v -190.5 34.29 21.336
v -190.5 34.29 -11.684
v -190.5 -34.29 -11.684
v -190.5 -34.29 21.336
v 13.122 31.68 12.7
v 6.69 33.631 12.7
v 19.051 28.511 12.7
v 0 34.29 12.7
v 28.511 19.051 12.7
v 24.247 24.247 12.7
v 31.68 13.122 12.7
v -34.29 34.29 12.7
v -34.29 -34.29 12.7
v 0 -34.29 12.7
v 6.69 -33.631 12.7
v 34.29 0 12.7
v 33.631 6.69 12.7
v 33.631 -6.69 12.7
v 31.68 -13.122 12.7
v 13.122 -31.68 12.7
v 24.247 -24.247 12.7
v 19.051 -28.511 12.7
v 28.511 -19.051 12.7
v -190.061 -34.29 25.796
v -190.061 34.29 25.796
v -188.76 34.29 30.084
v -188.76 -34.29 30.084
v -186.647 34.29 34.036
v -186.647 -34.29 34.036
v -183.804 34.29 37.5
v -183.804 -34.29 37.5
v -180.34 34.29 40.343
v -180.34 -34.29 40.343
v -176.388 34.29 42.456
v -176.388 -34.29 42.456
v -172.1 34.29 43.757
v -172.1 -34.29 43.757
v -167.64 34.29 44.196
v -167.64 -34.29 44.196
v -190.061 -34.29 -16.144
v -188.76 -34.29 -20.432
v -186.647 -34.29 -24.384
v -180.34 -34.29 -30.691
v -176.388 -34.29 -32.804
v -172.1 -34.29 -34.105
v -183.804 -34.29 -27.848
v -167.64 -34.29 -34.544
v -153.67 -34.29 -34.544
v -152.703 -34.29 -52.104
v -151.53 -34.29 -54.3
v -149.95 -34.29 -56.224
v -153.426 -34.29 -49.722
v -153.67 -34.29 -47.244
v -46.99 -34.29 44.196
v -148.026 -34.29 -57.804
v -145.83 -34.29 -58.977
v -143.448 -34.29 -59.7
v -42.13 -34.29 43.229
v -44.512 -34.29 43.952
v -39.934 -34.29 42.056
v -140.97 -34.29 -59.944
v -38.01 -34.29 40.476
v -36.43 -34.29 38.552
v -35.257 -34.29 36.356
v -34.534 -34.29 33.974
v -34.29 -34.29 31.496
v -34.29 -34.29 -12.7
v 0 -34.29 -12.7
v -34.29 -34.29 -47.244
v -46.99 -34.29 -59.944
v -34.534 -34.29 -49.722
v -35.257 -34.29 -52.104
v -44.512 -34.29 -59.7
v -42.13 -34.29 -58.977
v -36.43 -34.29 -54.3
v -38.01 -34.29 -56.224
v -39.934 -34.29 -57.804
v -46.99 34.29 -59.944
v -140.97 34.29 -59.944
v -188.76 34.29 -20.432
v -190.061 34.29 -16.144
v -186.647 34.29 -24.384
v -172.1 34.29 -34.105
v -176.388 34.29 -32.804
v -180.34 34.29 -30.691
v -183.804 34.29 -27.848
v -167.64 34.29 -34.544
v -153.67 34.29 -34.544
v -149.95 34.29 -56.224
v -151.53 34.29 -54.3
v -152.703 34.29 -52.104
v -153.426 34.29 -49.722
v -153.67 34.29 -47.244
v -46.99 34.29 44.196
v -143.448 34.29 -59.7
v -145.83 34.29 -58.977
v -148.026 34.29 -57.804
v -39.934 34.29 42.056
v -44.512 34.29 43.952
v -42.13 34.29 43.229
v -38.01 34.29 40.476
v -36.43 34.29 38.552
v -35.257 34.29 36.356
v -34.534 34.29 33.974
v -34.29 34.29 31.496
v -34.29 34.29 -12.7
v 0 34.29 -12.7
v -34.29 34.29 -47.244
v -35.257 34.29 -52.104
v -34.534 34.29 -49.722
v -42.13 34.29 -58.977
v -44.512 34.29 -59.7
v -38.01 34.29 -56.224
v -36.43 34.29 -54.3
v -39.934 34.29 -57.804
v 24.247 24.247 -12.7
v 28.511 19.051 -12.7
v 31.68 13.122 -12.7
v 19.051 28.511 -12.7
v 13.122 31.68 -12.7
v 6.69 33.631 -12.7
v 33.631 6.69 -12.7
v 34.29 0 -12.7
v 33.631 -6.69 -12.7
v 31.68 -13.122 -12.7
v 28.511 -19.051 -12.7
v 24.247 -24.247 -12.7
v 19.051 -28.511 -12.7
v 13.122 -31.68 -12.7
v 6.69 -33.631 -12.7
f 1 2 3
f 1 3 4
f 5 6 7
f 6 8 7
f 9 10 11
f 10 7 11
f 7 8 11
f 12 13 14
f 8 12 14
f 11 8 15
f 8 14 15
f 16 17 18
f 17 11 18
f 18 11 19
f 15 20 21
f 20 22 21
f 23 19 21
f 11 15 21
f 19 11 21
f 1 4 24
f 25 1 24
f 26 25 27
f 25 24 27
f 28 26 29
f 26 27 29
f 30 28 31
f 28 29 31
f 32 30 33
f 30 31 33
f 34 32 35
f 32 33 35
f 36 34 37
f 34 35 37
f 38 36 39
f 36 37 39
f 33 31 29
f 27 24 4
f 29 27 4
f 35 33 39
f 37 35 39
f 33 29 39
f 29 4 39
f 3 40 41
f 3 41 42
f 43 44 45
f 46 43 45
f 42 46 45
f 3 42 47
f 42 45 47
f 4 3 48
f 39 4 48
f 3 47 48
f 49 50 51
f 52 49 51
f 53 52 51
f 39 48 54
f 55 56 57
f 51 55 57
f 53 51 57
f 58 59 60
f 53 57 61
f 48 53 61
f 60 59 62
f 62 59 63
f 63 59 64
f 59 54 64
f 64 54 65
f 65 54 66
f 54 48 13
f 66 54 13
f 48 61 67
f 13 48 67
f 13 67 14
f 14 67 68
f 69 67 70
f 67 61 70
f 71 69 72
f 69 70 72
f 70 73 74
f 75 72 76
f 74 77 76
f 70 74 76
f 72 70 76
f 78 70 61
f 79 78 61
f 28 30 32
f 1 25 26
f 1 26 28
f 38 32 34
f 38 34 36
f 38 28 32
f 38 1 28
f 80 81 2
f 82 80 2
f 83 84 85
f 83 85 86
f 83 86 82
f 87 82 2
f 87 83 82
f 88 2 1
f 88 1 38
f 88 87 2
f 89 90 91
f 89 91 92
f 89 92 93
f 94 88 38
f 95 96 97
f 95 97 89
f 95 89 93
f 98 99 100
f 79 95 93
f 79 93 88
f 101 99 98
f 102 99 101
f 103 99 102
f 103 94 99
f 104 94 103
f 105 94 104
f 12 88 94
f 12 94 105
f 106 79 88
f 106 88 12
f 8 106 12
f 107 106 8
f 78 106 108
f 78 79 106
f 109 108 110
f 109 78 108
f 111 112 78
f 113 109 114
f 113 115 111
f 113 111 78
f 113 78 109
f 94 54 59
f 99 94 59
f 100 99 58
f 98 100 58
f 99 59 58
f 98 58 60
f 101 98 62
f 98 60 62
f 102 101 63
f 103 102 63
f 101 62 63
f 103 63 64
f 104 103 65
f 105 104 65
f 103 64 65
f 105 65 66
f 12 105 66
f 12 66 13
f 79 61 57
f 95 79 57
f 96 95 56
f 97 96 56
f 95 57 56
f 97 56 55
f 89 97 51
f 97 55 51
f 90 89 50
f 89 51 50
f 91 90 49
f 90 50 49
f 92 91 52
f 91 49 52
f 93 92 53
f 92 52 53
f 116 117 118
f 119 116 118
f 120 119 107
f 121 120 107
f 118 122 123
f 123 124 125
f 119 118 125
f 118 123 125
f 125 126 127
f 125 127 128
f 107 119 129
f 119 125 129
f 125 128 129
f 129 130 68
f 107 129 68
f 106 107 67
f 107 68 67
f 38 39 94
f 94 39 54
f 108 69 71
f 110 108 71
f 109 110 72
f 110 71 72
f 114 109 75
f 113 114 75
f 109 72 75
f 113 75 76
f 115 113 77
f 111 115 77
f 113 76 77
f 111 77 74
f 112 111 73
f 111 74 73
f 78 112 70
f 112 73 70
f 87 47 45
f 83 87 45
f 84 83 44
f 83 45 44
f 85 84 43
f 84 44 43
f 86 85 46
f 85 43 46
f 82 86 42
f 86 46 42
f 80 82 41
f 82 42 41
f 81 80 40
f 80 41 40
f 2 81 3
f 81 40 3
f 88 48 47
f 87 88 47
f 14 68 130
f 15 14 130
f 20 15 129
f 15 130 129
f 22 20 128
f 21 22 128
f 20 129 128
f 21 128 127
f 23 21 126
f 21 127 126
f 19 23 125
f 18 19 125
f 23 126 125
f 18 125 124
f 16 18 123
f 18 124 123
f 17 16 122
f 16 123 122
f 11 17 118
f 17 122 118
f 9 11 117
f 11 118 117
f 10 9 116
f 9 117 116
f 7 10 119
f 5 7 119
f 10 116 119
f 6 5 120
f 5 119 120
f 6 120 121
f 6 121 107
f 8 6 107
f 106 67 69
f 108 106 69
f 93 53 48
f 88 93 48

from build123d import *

# Parameters (mm, degrees)
BOSS_EXTRUDE1_DEPTH      = 34.29
BOSS_EXTRUDE1_DEPTH_BACK = 34.29
CUT_EXTRUDE1_DEPTH       = 203.631037198
CUT_EXTRUDE1_DEPTH_BACK  = 203.631037198


with BuildPart() as part:
    # Sketch1 → Boss-Extrude1 (new, two sides: drawn at the far end of the back side and taken through both)
    with BuildSketch(Plane(origin=(0, 0, 0), x_dir=(1, 0, 0), z_dir=(0, 1, 0)).offset(-BOSS_EXTRUDE1_DEPTH_BACK)):
        with BuildLine():
            Line((-34.29, -12.7), (34.29, -12.7))
            Line((34.29, -12.7), (34.29, 12.7))
            Line((34.29, 12.7), (-34.29, 12.7))
            Line((-34.29, 12.7), (-34.29, 47.244))
            ThreePointArc((-34.29, 47.244), (-38.009743879, 56.224256121), (-46.99, 59.944))
            Line((-46.99, 59.944), (-140.97, 59.944))
            ThreePointArc((-140.97, 59.944), (-149.950256121, 56.224256121), (-153.67, 47.244))
            Line((-153.67, 47.244), (-153.67, 34.544))
            Line((-153.67, 34.544), (-167.64, 34.544))
            ThreePointArc((-167.64, 34.544), (-183.804461018, 27.848461018), (-190.5, 11.684))
            Line((-190.5, 11.684), (-190.5, -21.336))
            ThreePointArc((-190.5, -21.336), (-183.804461018, -37.500461018), (-167.64, -44.196))
            Line((-167.64, -44.196), (-46.99, -44.196))
            ThreePointArc((-46.99, -44.196), (-38.009743879, -40.476256121), (-34.29, -31.496))
            Line((-34.29, -31.496), (-34.29, -12.7))
        make_face()
    extrude(amount=BOSS_EXTRUDE1_DEPTH + BOSS_EXTRUDE1_DEPTH_BACK)

    # Sketch2 → Cut-Extrude1 (cut, two sides: drawn at the far end of the back side and taken through both)
    with BuildSketch(Plane.XY.offset(-CUT_EXTRUDE1_DEPTH_BACK)):
        with BuildLine():
            Line((0, 34.29), (44.29, 34.29))
            Line((44.29, 34.29), (44.29, -34.29))
            Line((44.29, -34.29), (0, -34.29))
            ThreePointArc((0, -34.29), (34.29, 0), (0, 34.29))
        make_face()
    extrude(amount=CUT_EXTRUDE1_DEPTH + CUT_EXTRUDE1_DEPTH_BACK, mode=Mode.SUBTRACT)


solid = part.part
